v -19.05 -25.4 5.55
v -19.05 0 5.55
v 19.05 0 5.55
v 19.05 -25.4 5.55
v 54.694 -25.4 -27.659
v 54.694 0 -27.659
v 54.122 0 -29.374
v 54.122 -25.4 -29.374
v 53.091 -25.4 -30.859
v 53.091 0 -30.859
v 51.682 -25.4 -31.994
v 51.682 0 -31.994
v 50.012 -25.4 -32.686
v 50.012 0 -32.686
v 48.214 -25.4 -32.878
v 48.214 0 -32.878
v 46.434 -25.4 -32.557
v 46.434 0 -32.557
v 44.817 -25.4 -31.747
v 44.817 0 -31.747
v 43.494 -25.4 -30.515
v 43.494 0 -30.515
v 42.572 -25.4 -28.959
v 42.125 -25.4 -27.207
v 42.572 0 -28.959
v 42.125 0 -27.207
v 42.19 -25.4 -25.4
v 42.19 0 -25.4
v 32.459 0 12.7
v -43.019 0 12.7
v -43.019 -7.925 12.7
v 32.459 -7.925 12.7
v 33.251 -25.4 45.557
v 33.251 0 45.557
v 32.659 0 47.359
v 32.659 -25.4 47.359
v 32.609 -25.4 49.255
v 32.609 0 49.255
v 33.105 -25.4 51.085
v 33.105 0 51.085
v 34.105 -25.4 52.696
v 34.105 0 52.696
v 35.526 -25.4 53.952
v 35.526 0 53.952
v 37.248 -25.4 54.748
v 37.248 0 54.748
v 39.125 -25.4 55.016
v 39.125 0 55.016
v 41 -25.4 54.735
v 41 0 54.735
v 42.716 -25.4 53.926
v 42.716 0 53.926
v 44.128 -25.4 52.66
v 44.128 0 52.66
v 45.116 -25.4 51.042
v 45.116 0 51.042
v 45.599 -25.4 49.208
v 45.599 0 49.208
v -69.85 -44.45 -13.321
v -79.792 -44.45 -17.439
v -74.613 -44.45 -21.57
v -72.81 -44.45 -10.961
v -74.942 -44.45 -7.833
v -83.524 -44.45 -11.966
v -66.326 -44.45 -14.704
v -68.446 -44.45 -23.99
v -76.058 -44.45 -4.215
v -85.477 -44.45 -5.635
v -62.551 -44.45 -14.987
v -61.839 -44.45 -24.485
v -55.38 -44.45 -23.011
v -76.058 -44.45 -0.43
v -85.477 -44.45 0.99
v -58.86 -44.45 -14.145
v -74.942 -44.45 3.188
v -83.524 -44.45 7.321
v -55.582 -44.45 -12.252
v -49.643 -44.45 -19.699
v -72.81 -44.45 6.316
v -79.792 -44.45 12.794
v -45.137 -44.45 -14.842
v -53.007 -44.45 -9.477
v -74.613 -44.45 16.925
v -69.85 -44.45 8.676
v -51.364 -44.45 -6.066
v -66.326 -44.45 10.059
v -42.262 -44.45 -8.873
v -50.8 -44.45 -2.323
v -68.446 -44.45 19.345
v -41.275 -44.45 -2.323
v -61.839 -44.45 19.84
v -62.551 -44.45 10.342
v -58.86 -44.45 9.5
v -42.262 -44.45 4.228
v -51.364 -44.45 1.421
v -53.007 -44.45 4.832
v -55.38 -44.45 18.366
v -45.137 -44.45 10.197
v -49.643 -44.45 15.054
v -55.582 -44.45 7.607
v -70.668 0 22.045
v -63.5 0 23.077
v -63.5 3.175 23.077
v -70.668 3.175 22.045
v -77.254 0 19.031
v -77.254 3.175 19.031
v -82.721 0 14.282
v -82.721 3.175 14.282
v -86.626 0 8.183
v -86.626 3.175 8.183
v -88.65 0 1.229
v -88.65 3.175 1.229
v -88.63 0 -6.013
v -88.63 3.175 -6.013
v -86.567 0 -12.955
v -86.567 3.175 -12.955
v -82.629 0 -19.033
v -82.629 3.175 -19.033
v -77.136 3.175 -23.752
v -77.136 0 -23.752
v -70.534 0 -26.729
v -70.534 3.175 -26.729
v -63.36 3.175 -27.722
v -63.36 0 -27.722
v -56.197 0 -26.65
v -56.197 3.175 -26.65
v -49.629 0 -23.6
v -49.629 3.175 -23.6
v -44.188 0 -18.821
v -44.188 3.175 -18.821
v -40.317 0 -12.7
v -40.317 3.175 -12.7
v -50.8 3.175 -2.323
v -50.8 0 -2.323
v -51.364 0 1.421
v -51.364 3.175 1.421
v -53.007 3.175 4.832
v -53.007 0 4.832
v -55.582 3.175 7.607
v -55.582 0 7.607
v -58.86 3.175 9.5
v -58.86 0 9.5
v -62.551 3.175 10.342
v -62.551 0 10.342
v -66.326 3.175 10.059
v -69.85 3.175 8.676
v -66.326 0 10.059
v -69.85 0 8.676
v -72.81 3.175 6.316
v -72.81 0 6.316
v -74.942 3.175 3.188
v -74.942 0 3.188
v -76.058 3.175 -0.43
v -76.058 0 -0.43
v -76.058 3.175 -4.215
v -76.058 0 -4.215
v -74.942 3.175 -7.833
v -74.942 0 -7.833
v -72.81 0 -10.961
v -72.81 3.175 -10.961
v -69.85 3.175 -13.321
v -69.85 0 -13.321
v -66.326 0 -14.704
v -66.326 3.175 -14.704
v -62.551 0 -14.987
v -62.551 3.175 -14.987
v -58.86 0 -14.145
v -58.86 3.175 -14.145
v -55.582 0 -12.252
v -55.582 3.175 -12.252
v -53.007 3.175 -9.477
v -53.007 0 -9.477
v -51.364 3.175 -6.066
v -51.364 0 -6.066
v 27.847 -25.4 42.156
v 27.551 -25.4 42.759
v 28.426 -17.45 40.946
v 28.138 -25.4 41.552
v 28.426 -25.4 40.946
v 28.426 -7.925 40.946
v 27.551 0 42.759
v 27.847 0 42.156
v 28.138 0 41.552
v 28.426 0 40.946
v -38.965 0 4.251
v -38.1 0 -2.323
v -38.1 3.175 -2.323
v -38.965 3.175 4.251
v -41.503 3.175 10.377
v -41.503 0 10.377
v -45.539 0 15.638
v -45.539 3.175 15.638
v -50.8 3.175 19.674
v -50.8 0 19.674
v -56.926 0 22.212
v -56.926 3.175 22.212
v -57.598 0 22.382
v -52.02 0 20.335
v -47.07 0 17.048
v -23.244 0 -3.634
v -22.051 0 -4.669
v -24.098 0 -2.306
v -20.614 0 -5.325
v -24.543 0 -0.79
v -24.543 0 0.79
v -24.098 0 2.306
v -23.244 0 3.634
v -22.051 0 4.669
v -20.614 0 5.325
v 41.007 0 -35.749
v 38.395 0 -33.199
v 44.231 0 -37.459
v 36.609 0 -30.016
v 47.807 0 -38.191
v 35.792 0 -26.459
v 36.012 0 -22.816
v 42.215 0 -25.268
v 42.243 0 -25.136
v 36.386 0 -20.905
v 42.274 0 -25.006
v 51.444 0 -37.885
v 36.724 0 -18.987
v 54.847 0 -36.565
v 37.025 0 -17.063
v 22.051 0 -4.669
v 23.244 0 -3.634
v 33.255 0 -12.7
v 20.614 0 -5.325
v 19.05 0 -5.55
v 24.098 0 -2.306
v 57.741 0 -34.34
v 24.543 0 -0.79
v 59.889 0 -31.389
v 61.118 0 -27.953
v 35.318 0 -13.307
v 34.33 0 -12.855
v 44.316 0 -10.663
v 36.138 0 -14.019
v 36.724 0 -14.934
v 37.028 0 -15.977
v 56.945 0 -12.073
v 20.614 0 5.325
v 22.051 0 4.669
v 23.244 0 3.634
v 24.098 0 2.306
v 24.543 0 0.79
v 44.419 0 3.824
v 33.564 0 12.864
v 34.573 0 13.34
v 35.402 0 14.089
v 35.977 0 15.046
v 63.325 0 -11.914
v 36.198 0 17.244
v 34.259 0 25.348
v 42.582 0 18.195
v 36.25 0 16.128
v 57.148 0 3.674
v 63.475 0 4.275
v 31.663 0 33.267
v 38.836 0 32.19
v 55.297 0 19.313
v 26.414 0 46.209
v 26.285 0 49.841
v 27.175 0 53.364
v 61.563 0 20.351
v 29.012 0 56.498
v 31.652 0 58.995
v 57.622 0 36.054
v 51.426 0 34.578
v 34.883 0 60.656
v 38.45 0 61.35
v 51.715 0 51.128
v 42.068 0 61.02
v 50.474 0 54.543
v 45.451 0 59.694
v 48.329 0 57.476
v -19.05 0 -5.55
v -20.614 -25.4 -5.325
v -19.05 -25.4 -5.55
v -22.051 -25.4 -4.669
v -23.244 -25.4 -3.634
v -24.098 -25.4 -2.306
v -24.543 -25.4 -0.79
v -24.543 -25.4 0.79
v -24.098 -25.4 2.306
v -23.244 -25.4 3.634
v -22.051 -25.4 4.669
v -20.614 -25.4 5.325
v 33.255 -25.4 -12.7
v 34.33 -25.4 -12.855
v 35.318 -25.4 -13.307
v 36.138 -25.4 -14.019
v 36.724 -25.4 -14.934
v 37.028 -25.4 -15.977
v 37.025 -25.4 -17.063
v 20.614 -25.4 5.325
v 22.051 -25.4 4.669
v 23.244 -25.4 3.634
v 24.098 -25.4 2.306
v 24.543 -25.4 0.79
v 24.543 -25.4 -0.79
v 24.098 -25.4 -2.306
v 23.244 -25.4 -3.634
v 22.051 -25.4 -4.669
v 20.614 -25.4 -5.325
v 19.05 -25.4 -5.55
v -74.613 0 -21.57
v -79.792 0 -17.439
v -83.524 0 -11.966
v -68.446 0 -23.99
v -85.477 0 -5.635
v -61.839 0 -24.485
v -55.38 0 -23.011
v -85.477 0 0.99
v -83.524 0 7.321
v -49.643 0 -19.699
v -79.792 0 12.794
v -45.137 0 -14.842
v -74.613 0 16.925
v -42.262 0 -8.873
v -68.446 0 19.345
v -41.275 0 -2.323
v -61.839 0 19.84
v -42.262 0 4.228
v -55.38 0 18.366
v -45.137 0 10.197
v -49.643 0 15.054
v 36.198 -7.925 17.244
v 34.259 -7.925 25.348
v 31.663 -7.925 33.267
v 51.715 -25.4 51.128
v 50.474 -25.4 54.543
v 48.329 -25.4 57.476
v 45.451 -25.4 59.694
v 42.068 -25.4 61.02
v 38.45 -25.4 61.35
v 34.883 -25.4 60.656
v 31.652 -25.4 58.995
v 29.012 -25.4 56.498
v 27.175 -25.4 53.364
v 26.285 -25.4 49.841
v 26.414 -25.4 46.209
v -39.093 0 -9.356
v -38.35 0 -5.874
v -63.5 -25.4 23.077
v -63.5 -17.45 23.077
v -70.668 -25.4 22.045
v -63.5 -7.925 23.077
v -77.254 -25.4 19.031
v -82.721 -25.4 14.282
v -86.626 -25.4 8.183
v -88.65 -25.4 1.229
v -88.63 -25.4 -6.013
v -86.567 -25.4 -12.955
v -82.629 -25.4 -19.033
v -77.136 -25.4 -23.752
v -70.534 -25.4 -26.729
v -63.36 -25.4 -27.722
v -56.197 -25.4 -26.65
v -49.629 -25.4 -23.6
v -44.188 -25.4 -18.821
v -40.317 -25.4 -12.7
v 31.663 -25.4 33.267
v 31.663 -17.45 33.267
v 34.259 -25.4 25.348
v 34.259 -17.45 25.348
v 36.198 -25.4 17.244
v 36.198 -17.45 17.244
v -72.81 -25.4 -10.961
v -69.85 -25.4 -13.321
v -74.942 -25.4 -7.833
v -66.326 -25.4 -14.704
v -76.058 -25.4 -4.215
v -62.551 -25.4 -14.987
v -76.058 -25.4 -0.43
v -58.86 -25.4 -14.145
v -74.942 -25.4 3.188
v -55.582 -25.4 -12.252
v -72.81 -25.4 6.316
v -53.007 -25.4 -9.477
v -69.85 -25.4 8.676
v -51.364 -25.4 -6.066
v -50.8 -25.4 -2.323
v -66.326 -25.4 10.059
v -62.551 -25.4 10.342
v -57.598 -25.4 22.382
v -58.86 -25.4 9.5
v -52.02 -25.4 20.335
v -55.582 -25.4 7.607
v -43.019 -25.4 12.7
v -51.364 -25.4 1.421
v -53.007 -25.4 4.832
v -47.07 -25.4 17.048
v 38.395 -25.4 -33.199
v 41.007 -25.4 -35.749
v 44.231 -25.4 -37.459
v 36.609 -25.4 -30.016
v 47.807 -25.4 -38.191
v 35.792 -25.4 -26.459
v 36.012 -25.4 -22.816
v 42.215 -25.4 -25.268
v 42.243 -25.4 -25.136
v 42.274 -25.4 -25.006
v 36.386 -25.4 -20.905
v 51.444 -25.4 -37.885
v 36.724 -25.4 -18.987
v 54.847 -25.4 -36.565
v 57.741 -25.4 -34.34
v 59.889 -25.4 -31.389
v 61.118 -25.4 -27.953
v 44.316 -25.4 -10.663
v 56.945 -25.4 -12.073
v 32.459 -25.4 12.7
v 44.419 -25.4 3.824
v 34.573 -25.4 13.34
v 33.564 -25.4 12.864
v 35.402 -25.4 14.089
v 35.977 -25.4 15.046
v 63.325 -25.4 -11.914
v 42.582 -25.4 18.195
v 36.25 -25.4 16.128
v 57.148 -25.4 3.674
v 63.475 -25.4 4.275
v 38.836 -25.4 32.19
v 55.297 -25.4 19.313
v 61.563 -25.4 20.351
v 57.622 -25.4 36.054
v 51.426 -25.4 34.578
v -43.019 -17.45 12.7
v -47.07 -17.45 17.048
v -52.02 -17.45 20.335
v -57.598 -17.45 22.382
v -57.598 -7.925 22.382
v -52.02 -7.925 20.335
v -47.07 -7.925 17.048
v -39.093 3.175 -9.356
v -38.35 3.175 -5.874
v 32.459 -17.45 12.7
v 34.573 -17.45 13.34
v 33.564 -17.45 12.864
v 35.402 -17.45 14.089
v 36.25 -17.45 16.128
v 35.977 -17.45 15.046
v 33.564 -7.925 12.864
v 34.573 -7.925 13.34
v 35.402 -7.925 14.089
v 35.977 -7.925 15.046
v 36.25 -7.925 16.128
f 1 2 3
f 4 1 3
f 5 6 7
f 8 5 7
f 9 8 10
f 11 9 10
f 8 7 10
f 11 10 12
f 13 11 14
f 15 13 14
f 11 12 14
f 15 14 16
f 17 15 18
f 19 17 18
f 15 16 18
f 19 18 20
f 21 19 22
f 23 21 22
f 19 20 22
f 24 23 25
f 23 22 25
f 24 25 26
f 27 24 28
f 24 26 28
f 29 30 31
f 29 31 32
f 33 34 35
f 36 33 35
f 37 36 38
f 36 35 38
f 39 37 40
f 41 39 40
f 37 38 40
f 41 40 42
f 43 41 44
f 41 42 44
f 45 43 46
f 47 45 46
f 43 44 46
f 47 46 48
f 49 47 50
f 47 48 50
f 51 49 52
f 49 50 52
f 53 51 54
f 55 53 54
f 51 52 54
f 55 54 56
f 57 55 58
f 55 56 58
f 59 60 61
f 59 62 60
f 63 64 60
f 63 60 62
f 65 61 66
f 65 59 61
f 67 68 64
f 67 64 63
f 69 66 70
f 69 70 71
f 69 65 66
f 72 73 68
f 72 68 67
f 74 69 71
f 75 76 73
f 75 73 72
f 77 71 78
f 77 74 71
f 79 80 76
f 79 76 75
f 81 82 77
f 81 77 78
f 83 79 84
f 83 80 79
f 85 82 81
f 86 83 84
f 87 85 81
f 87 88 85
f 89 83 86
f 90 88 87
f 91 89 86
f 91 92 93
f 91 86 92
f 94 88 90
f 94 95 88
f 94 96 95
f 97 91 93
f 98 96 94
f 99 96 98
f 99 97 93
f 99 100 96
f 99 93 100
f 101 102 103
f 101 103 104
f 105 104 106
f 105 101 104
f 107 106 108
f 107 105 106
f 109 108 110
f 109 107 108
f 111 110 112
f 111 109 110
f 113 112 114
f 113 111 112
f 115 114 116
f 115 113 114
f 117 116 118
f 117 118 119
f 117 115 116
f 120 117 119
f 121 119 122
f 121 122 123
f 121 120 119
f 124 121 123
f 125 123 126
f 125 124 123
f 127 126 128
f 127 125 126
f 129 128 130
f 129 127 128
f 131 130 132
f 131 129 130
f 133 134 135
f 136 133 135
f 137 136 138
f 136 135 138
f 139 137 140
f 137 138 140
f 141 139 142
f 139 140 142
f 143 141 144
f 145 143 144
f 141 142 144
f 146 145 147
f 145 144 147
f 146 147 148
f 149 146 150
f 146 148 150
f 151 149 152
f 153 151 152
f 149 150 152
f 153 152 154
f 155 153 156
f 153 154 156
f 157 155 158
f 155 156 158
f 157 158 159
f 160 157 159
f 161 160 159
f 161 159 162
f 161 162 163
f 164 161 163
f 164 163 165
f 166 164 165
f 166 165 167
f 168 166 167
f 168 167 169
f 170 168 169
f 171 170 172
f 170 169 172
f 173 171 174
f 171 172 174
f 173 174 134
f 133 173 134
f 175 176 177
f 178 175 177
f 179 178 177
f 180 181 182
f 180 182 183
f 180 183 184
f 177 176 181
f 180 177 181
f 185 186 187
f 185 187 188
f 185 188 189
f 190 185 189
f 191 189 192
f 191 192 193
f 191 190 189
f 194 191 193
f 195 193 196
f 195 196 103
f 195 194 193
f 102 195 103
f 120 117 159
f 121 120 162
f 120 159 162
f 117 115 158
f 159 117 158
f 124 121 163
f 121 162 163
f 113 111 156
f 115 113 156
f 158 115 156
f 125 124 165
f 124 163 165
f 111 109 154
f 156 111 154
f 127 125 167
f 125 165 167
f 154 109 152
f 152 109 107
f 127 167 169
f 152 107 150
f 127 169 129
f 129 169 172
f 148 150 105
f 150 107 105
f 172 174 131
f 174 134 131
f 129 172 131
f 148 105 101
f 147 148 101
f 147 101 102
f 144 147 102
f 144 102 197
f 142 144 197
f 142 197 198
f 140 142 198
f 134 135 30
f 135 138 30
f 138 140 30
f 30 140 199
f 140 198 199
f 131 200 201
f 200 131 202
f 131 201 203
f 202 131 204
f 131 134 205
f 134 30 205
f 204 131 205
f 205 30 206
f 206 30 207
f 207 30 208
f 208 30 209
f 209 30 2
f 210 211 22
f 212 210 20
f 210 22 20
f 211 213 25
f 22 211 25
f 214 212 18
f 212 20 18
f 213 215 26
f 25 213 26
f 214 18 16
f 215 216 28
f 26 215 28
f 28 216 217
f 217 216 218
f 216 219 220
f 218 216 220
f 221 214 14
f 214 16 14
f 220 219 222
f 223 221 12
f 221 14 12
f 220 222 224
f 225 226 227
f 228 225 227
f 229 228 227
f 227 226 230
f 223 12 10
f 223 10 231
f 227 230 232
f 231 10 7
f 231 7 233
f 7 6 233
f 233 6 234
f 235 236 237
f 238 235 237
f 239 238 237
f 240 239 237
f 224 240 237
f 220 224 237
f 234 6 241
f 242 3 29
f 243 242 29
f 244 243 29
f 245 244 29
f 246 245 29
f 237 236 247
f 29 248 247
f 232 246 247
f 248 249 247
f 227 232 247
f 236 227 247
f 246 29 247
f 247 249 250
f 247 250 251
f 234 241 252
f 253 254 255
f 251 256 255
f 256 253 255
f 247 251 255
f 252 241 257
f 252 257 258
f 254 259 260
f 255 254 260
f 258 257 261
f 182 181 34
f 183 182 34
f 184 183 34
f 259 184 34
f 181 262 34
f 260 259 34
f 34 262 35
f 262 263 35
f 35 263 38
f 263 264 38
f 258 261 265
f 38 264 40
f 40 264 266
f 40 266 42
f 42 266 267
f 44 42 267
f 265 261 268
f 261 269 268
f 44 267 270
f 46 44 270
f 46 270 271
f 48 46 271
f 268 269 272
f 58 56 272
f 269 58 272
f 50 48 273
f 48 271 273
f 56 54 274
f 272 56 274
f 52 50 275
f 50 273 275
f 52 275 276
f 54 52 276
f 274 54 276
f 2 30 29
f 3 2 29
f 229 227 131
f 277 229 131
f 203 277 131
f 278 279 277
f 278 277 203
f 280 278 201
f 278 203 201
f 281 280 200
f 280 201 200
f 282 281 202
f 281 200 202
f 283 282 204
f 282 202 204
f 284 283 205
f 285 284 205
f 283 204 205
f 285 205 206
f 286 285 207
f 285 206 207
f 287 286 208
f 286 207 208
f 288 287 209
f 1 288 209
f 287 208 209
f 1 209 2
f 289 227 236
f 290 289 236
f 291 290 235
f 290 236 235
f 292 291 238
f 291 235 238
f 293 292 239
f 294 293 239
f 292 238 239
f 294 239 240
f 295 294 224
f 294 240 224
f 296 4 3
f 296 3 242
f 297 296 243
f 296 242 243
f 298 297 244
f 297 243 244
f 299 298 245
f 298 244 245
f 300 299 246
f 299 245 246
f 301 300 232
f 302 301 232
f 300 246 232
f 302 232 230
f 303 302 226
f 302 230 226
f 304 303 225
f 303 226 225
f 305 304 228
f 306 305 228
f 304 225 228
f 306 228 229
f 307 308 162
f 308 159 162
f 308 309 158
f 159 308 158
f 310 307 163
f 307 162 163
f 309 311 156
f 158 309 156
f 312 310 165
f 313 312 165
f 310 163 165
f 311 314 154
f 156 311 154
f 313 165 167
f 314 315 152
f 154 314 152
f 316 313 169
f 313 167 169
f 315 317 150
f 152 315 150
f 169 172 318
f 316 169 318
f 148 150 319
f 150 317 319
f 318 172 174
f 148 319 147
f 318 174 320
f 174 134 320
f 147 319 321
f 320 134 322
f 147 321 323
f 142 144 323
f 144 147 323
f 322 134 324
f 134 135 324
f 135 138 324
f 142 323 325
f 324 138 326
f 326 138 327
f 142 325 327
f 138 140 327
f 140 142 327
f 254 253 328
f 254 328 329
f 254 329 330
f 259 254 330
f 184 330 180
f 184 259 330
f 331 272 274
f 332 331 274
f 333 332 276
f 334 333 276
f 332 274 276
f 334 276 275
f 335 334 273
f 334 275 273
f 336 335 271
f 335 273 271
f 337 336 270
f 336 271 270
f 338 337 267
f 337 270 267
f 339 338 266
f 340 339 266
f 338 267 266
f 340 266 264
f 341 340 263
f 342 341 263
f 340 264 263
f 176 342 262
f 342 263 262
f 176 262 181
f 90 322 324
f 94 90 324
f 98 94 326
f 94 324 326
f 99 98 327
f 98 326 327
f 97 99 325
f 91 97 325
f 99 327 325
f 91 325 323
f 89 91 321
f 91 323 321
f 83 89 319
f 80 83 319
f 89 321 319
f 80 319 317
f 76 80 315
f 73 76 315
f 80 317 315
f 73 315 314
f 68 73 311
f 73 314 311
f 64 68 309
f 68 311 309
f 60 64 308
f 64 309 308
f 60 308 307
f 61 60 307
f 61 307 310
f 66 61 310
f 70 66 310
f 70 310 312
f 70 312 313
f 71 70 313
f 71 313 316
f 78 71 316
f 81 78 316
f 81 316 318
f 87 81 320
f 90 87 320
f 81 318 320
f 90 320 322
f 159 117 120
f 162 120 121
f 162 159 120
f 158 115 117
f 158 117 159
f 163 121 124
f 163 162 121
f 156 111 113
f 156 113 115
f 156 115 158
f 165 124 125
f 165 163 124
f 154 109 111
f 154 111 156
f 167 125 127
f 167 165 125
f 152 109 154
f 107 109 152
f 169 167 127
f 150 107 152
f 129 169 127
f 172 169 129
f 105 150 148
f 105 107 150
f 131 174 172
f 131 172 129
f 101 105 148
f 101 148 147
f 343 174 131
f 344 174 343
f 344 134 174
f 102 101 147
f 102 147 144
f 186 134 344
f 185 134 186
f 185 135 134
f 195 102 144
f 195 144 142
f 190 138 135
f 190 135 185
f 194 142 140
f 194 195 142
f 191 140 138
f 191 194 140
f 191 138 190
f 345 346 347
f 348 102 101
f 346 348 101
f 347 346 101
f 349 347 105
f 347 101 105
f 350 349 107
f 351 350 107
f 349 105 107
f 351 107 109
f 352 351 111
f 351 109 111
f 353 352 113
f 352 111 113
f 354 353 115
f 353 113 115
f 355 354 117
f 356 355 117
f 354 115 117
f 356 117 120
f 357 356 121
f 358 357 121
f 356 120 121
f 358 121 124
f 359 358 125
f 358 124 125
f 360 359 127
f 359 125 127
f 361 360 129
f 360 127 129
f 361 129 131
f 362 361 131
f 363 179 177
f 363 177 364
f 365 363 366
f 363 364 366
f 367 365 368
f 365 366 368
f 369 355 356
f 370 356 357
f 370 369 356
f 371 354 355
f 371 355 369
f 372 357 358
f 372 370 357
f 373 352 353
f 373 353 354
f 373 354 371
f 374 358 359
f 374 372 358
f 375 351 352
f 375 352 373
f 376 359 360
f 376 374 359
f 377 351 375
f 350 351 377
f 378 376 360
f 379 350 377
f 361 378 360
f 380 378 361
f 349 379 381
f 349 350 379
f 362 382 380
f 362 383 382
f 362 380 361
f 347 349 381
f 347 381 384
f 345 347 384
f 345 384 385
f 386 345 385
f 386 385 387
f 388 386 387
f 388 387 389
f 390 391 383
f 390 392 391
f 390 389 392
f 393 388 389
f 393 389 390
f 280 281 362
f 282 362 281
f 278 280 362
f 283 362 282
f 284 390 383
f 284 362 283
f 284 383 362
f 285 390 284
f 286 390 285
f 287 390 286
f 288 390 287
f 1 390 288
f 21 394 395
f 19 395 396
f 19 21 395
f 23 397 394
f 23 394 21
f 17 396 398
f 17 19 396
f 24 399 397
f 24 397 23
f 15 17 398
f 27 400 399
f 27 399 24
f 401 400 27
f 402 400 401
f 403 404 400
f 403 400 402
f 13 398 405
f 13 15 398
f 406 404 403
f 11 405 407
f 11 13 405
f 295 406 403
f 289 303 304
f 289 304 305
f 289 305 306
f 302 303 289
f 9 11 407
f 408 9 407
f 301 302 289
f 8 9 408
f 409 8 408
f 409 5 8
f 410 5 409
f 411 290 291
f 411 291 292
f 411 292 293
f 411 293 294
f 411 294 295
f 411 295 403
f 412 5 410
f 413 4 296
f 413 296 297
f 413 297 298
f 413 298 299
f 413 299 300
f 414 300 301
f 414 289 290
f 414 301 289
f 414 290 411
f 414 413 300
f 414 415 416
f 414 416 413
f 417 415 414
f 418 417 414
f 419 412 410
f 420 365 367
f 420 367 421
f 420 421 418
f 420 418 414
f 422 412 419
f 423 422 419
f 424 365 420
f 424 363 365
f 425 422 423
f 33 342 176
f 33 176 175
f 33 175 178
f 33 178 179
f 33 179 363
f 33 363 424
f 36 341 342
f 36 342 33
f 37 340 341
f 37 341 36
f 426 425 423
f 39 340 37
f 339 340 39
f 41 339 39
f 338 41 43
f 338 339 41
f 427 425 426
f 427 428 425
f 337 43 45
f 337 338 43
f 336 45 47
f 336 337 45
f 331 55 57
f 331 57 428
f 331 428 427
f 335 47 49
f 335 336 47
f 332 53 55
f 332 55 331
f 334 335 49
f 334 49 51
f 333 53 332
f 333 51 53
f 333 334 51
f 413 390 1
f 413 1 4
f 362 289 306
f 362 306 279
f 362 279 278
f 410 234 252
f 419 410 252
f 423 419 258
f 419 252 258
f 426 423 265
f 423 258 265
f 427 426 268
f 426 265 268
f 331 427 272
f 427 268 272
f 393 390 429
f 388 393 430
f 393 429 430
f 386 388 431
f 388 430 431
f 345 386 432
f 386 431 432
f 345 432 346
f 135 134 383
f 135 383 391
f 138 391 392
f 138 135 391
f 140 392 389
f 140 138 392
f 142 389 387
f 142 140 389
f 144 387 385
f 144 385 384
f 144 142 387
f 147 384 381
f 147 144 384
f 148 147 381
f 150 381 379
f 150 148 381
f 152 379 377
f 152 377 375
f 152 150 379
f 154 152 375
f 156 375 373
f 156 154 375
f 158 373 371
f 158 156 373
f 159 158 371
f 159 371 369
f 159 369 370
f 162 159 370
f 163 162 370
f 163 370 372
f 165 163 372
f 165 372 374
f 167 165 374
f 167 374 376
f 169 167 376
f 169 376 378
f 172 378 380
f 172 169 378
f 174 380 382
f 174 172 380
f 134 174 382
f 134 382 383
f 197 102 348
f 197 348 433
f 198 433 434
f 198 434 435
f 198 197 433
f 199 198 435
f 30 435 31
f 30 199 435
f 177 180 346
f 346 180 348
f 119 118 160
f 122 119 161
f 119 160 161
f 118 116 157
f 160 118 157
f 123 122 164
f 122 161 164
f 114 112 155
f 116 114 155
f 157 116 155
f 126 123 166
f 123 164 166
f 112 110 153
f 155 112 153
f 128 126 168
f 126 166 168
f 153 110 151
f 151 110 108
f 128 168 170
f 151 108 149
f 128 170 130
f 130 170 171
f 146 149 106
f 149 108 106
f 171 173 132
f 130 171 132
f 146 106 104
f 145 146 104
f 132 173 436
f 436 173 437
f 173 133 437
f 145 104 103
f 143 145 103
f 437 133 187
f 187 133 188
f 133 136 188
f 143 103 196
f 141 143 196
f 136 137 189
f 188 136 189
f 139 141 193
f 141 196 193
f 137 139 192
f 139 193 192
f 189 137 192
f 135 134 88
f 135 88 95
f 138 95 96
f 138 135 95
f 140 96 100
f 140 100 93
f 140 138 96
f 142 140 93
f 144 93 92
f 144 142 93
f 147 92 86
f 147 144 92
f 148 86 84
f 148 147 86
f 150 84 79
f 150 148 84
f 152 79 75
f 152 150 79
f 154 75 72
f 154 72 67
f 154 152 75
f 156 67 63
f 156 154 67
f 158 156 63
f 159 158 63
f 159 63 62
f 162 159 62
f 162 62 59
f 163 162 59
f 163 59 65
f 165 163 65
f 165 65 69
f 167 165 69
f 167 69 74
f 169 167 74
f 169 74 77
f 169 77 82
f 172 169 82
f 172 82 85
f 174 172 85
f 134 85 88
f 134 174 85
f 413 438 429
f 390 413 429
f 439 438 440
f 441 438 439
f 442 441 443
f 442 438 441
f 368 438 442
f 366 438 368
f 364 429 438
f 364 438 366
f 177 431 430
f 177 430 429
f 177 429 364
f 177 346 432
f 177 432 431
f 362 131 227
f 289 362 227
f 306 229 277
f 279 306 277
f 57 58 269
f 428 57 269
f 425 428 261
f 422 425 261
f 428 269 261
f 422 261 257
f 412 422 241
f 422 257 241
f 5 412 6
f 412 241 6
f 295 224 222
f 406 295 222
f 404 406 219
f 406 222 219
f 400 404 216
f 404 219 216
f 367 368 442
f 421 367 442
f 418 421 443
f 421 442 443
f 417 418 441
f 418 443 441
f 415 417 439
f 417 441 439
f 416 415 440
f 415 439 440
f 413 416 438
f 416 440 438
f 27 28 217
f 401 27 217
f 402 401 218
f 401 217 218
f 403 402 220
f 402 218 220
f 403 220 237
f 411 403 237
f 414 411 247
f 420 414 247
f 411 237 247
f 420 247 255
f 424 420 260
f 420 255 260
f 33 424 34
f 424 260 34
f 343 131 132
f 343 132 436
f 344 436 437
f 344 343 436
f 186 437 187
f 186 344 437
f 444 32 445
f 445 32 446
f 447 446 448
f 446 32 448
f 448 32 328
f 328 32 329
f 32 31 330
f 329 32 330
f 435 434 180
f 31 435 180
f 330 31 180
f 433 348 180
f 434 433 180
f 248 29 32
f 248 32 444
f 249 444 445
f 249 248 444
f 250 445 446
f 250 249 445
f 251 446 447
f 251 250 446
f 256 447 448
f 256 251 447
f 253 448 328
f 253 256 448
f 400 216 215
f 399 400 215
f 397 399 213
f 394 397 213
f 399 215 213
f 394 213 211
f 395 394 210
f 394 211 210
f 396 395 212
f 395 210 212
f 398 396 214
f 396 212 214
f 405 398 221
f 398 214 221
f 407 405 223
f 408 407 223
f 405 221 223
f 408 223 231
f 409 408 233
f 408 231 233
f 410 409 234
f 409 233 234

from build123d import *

# Parameters (mm, degrees)
F0_R     = 22.225
F0_R_2   = 12.7
F1_DEPTH = 25.4
F2_DEPTH = 44.45
F3_DEPTH = 3.175
F4_DEPTH = 17.4498
F5_DEPTH = 7.9248


with BuildPart() as f1:
    # F0 (on Front) → F1 (new body)
    with BuildSketch(Plane.XZ):
        with BuildLine():
            Line((28.6733515832, 12.7), (-43.0187255819, 12.7))
            ThreePointArc((-43.0187255819, 12.7), (-39.3609821014, 5.5810953524), (-38.1, -2.3225629708))
            ThreePointArc((-38.1, -2.3225629708), (-38.6603373258, -7.6283294781), (-40.3166266323, -12.7))
            Line((-40.3166266323, -12.7), (28.6733515832, -12.7))
            Line((28.6733515832, -12.7), (33.2553653837, -12.7))
            ThreePointArc((33.2553653837, -12.7), (36.1382550159, -14.0190067506), (37.0250549441, -17.0627572869))
            ThreePointArc((37.0250549441, -17.0627572869), (36.5597775982, -19.9464361831), (36.0117960852, -22.8155481096))
            ThreePointArc((36.0117960852, -22.8155481096), (45.993088379, -37.9530956056), (61.1179671118, -27.9526164488))
            ThreePointArc((61.1179671118, -27.9526164488), (62.7752437383, 12.3436674732), (51.7147344593, 51.1277131392))
            ThreePointArc((51.7147344593, 51.1277131392), (34.8831774474, 60.656419548), (27.5508360528, 42.7585334455))
            ThreePointArc((27.5508360528, 42.7585334455), (27.9929024003, 41.8544537956), (28.4259920573, 40.9460397831))
            ThreePointArc((28.4259920573, 40.9460397831), (33.0422300736, 29.3343132556), (36.198144095, 17.2437362196))
            ThreePointArc((36.198144095, 17.2437362196), (35.4015407636, 14.0891979632), (32.4594636915, 12.7))
            Line((32.4594636915, 12.7), (28.6733515832, 12.7))
        make_face()
        with BuildLine():
            Line((-19.05, 5.5499), (19.05, 5.5499))
            ThreePointArc((19.05, 5.5499), (24.5999, 0), (19.05, -5.5499))
            Line((19.05, -5.5499), (-19.05, -5.5499))
            ThreePointArc((-19.05, -5.5499), (-24.5999, 0), (-19.05, 5.5499))
        make_face(mode=Mode.SUBTRACT)
        with BuildLine():
            ThreePointArc((45.5992916154, 49.2079816191), (56.4779805656, 11.5237748752), (54.6936829038, -27.6586394588))
            ThreePointArc((54.6936829038, -27.6586394588), (47.3123292859, -32.7813536179), (42.1896151268, -25.4))
            ThreePointArc((42.1896151268, -25.4), (42.2286106989, -25.2021250663), (42.2738673123, -25.0055875814))
            ThreePointArc((42.2738673123, -25.0055875814), (43.7417669199, 11.0404436441), (33.2508024974, 45.5572621802))
            ThreePointArc((33.2508024974, 45.5572621802), (37.2475404836, 54.7479964973), (45.5992916154, 49.2079816191))
        make_face(mode=Mode.SUBTRACT)
        with BuildLine():
            ThreePointArc((-38.1, -2.3225629708), (-39.3609821014, 5.5810953524), (-43.0187255819, 12.7))
            ThreePointArc((-43.0187255819, 12.7), (-52.0198671492, 20.3350306731), (-63.5, 23.0774370292))
            ThreePointArc((-63.5, 23.0774370292), (-84.8160373961, -16.1351134134), (-40.3166266323, -12.7))
            ThreePointArc((-40.3166266323, -12.7), (-38.6603373258, -7.6283294781), (-38.1, -2.3225629708))
        make_face()
        with Locations((-63.5, -2.3225629708)):
            Circle(F0_R, mode=Mode.SUBTRACT)
        with Locations((-63.5, -2.3225629708)):
            Circle(F0_R)
        with Locations((-63.5, -2.3225629708)):
            Circle(F0_R_2, mode=Mode.SUBTRACT)
    extrude(amount=F1_DEPTH)

    # F0 (on Front) → F4 (join)
    with BuildSketch(Plane.XZ):
        with BuildLine():
            ThreePointArc((-63.5, 23.0774370292), (-52.0198671492, 20.3350306731), (-43.0187255819, 12.7))
            Line((-43.0187255819, 12.7), (28.6733515832, 12.7))
            Line((28.6733515832, 12.7), (32.4594636915, 12.7))
            ThreePointArc((32.4594636915, 12.7), (35.4015407636, 14.0891979632), (36.198144095, 17.2437362196))
            ThreePointArc((36.198144095, 17.2437362196), (33.0422300736, 29.3343132556), (28.4259920573, 40.9460397831))
            Line((28.4259920573, 40.9460397831), (-63.5, 23.0774370292))
        make_face()
    extrude(amount=F4_DEPTH)

    # F0 (on Front) → F5 (cut)
    with BuildSketch(Plane.XZ):
        with BuildLine():
            ThreePointArc((-63.5, 23.0774370292), (-52.0198671492, 20.3350306731), (-43.0187255819, 12.7))
            Line((-43.0187255819, 12.7), (28.6733515832, 12.7))
            Line((28.6733515832, 12.7), (32.4594636915, 12.7))
            ThreePointArc((32.4594636915, 12.7), (35.4015407636, 14.0891979632), (36.198144095, 17.2437362196))
            ThreePointArc((36.198144095, 17.2437362196), (33.0422300736, 29.3343132556), (28.4259920573, 40.9460397831))
            Line((28.4259920573, 40.9460397831), (-63.5, 23.0774370292))
        make_face()
    extrude(amount=F5_DEPTH, mode=Mode.SUBTRACT)


with BuildPart() as f2:
    # F0 (on Front) → F2 (new body)
    with BuildSketch(Plane.XZ):
        with Locations((-63.5, -2.3225629708)):
            Circle(F0_R)
        with Locations((-63.5, -2.3225629708)):
            Circle(F0_R_2, mode=Mode.SUBTRACT)
    extrude(amount=F2_DEPTH)


with BuildPart() as f3:
    # F0 (on Front) → F3 (new body)
    with BuildSketch(Plane.XZ):
        with BuildLine():
            ThreePointArc((-38.1, -2.3225629708), (-39.3609821014, 5.5810953524), (-43.0187255819, 12.7))
            ThreePointArc((-43.0187255819, 12.7), (-52.0198671492, 20.3350306731), (-63.5, 23.0774370292))
            ThreePointArc((-63.5, 23.0774370292), (-84.8160373961, -16.1351134134), (-40.3166266323, -12.7))
            ThreePointArc((-40.3166266323, -12.7), (-38.6603373258, -7.6283294781), (-38.1, -2.3225629708))
        make_face()
        with Locations((-63.5, -2.3225629708)):
            Circle(F0_R, mode=Mode.SUBTRACT)
        with Locations((-63.5, -2.3225629708)):
            Circle(F0_R)
        with Locations((-63.5, -2.3225629708)):
            Circle(F0_R_2, mode=Mode.SUBTRACT)
    extrude(amount=-F3_DEPTH)


solid = Compound([f1.part, f2.part, f3.part])
